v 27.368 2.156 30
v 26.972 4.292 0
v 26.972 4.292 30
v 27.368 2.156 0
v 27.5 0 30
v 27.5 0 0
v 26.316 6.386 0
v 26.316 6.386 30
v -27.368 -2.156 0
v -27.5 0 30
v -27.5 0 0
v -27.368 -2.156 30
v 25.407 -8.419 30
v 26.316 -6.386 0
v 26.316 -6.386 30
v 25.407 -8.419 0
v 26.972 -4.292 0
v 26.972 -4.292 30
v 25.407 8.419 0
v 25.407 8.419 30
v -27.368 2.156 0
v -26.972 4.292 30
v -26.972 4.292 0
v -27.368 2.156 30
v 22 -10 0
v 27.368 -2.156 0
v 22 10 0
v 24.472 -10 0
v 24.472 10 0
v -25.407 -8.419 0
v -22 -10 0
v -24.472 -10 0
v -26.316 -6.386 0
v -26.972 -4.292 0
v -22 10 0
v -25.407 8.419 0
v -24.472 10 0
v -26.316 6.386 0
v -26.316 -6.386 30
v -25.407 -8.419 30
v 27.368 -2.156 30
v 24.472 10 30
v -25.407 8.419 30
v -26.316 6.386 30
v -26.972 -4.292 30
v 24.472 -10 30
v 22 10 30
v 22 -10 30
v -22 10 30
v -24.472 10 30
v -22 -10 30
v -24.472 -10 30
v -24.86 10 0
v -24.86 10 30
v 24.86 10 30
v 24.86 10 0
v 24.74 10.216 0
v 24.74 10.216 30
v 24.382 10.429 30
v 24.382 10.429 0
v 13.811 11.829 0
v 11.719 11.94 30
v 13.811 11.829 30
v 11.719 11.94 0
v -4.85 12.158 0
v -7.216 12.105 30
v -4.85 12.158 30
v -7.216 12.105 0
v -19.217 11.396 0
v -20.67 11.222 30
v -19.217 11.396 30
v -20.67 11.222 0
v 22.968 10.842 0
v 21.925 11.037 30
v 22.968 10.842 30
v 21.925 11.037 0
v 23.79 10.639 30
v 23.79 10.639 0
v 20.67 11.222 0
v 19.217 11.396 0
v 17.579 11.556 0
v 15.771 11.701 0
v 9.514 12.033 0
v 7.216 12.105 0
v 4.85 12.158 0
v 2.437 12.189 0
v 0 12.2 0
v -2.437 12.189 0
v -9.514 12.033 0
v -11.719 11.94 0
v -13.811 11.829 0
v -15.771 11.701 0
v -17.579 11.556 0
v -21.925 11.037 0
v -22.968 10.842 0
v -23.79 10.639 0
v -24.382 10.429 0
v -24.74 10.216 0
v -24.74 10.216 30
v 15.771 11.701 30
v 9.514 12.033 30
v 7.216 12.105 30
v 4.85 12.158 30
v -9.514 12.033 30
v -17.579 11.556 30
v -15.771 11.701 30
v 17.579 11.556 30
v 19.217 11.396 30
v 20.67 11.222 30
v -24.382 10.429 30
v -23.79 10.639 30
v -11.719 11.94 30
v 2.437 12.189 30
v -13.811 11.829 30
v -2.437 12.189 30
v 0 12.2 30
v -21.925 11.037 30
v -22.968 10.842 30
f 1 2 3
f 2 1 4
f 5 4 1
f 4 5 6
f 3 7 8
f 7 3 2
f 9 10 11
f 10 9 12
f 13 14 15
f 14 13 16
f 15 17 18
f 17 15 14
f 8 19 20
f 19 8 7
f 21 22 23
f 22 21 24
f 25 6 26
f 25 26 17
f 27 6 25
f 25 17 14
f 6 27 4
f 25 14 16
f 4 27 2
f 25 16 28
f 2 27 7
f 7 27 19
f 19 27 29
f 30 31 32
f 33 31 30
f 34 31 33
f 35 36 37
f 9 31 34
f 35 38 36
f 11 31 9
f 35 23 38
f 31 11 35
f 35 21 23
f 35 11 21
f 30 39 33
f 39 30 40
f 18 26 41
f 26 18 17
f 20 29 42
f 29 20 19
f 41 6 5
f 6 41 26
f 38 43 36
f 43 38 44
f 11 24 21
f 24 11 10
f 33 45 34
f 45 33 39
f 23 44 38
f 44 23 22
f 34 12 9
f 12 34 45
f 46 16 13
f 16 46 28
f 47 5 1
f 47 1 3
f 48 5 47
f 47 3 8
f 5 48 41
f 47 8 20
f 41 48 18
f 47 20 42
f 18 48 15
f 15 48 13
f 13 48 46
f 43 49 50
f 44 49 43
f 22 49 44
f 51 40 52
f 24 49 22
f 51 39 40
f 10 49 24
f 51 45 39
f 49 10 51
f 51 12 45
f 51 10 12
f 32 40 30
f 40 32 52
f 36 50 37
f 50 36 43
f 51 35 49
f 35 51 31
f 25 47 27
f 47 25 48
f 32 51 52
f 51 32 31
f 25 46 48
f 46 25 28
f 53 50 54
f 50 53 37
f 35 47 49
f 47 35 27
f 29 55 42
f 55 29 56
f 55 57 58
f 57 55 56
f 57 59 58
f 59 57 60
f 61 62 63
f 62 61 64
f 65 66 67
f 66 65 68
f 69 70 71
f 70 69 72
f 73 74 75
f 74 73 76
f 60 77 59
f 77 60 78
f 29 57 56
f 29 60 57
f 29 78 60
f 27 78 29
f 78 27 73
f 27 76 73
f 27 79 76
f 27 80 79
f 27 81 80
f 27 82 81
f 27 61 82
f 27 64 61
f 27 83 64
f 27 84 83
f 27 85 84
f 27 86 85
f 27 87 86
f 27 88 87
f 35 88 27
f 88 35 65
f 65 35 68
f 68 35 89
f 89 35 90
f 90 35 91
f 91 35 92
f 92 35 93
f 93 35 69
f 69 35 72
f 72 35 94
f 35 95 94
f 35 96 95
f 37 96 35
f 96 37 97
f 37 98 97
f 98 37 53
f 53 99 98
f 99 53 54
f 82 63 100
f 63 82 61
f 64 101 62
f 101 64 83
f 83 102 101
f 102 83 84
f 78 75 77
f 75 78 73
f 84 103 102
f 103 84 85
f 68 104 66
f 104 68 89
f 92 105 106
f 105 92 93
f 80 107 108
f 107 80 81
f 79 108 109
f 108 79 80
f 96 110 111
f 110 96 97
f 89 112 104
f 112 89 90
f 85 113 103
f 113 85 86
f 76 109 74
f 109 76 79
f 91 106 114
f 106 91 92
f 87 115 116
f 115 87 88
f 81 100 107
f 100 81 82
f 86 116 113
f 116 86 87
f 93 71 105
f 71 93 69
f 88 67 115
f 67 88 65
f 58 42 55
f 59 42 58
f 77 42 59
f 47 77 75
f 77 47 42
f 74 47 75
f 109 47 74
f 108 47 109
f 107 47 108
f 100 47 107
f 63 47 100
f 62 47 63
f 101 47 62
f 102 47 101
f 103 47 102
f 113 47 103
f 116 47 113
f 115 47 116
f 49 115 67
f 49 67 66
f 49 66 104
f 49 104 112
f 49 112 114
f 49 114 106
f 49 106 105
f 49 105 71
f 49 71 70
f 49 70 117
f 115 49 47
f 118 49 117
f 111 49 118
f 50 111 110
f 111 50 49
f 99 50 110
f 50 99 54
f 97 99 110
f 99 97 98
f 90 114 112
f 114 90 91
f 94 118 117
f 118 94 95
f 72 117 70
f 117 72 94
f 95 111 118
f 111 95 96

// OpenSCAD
xI=44;
xO=55;
z=30;
yI=20;
iR=0.001;
$fn=64;

fret();

module fret(){
difference(){
scale([1,0.8,1])cylinder(d=xO,h=z);
translate([0,0,-1])rcube([xI,yI*2,z+2],iR);
translate([0,-yI,-1])rcube([xO,yI,z+2],iR);
translate([0,yI,-1])rcube([xO,yI,z+2],iR);
}

difference(){
translate([0,yI/2,0])scale([1.13,0.1,1])cylinder(d=xI,h=z);
translate([0,0,-1])rcube([xI*2,yI,z+2],iR);
translate([0,-yI,-1])rcube([xO,yI*2,z+2],iR);
}

module rcube(size,radius){
$fn=32;
linear_extrude(height=size[2])
hull()
{
    // place 4 circles in the corners, with the given radius
    translate([(-size[0]/2)+(radius), (-size[1]/2)+(radius), 0])
    circle(r=radius);

    translate([(size[0]/2)-(radius), (-size[1]/2)+(radius), 0])
    circle(r=radius);

    translate([(-size[0]/2)+(radius), (size[1]/2)-(radius), 0])
    circle(r=radius);

    translate([(size[0]/2)-(radius), (size[1]/2)-(radius), 0])
    circle(r=radius);
}
}
}

module space(){
difference(){
scale([1,0.8,1])cylinder(d=xO,h=z);
translate([0,0,-1])rcube([xI,yI*2,z+2],iR);
translate([0,-yI,-1])rcube([xO,yI,z+2],iR);
translate([0,yI,-1])rcube([xO,yI,z+2],iR);
}

difference(){
translate([0,yI/2-1.15,0])scale([1.13,0.3,1])cylinder(d=xI,h=z);
translate([0,0,-1])rcube([xI*2,yI,z+2],iR);
translate([0,-yI,-1])rcube([xO,yI*2,z+2],iR);
}

module rcube(size,radius){
$fn=32;
linear_extrude(height=size[2])
hull()
{
    // place 4 circles in the corners, with the given radius
    translate([(-size[0]/2)+(radius), (-size[1]/2)+(radius), 0])
    circle(r=radius);

    translate([(size[0]/2)-(radius), (-size[1]/2)+(radius), 0])
    circle(r=radius);

    translate([(-size[0]/2)+(radius), (size[1]/2)-(radius), 0])
    circle(r=radius);

    translate([(size[0]/2)-(radius), (size[1]/2)-(radius), 0])
    circle(r=radius);
}
}
}
